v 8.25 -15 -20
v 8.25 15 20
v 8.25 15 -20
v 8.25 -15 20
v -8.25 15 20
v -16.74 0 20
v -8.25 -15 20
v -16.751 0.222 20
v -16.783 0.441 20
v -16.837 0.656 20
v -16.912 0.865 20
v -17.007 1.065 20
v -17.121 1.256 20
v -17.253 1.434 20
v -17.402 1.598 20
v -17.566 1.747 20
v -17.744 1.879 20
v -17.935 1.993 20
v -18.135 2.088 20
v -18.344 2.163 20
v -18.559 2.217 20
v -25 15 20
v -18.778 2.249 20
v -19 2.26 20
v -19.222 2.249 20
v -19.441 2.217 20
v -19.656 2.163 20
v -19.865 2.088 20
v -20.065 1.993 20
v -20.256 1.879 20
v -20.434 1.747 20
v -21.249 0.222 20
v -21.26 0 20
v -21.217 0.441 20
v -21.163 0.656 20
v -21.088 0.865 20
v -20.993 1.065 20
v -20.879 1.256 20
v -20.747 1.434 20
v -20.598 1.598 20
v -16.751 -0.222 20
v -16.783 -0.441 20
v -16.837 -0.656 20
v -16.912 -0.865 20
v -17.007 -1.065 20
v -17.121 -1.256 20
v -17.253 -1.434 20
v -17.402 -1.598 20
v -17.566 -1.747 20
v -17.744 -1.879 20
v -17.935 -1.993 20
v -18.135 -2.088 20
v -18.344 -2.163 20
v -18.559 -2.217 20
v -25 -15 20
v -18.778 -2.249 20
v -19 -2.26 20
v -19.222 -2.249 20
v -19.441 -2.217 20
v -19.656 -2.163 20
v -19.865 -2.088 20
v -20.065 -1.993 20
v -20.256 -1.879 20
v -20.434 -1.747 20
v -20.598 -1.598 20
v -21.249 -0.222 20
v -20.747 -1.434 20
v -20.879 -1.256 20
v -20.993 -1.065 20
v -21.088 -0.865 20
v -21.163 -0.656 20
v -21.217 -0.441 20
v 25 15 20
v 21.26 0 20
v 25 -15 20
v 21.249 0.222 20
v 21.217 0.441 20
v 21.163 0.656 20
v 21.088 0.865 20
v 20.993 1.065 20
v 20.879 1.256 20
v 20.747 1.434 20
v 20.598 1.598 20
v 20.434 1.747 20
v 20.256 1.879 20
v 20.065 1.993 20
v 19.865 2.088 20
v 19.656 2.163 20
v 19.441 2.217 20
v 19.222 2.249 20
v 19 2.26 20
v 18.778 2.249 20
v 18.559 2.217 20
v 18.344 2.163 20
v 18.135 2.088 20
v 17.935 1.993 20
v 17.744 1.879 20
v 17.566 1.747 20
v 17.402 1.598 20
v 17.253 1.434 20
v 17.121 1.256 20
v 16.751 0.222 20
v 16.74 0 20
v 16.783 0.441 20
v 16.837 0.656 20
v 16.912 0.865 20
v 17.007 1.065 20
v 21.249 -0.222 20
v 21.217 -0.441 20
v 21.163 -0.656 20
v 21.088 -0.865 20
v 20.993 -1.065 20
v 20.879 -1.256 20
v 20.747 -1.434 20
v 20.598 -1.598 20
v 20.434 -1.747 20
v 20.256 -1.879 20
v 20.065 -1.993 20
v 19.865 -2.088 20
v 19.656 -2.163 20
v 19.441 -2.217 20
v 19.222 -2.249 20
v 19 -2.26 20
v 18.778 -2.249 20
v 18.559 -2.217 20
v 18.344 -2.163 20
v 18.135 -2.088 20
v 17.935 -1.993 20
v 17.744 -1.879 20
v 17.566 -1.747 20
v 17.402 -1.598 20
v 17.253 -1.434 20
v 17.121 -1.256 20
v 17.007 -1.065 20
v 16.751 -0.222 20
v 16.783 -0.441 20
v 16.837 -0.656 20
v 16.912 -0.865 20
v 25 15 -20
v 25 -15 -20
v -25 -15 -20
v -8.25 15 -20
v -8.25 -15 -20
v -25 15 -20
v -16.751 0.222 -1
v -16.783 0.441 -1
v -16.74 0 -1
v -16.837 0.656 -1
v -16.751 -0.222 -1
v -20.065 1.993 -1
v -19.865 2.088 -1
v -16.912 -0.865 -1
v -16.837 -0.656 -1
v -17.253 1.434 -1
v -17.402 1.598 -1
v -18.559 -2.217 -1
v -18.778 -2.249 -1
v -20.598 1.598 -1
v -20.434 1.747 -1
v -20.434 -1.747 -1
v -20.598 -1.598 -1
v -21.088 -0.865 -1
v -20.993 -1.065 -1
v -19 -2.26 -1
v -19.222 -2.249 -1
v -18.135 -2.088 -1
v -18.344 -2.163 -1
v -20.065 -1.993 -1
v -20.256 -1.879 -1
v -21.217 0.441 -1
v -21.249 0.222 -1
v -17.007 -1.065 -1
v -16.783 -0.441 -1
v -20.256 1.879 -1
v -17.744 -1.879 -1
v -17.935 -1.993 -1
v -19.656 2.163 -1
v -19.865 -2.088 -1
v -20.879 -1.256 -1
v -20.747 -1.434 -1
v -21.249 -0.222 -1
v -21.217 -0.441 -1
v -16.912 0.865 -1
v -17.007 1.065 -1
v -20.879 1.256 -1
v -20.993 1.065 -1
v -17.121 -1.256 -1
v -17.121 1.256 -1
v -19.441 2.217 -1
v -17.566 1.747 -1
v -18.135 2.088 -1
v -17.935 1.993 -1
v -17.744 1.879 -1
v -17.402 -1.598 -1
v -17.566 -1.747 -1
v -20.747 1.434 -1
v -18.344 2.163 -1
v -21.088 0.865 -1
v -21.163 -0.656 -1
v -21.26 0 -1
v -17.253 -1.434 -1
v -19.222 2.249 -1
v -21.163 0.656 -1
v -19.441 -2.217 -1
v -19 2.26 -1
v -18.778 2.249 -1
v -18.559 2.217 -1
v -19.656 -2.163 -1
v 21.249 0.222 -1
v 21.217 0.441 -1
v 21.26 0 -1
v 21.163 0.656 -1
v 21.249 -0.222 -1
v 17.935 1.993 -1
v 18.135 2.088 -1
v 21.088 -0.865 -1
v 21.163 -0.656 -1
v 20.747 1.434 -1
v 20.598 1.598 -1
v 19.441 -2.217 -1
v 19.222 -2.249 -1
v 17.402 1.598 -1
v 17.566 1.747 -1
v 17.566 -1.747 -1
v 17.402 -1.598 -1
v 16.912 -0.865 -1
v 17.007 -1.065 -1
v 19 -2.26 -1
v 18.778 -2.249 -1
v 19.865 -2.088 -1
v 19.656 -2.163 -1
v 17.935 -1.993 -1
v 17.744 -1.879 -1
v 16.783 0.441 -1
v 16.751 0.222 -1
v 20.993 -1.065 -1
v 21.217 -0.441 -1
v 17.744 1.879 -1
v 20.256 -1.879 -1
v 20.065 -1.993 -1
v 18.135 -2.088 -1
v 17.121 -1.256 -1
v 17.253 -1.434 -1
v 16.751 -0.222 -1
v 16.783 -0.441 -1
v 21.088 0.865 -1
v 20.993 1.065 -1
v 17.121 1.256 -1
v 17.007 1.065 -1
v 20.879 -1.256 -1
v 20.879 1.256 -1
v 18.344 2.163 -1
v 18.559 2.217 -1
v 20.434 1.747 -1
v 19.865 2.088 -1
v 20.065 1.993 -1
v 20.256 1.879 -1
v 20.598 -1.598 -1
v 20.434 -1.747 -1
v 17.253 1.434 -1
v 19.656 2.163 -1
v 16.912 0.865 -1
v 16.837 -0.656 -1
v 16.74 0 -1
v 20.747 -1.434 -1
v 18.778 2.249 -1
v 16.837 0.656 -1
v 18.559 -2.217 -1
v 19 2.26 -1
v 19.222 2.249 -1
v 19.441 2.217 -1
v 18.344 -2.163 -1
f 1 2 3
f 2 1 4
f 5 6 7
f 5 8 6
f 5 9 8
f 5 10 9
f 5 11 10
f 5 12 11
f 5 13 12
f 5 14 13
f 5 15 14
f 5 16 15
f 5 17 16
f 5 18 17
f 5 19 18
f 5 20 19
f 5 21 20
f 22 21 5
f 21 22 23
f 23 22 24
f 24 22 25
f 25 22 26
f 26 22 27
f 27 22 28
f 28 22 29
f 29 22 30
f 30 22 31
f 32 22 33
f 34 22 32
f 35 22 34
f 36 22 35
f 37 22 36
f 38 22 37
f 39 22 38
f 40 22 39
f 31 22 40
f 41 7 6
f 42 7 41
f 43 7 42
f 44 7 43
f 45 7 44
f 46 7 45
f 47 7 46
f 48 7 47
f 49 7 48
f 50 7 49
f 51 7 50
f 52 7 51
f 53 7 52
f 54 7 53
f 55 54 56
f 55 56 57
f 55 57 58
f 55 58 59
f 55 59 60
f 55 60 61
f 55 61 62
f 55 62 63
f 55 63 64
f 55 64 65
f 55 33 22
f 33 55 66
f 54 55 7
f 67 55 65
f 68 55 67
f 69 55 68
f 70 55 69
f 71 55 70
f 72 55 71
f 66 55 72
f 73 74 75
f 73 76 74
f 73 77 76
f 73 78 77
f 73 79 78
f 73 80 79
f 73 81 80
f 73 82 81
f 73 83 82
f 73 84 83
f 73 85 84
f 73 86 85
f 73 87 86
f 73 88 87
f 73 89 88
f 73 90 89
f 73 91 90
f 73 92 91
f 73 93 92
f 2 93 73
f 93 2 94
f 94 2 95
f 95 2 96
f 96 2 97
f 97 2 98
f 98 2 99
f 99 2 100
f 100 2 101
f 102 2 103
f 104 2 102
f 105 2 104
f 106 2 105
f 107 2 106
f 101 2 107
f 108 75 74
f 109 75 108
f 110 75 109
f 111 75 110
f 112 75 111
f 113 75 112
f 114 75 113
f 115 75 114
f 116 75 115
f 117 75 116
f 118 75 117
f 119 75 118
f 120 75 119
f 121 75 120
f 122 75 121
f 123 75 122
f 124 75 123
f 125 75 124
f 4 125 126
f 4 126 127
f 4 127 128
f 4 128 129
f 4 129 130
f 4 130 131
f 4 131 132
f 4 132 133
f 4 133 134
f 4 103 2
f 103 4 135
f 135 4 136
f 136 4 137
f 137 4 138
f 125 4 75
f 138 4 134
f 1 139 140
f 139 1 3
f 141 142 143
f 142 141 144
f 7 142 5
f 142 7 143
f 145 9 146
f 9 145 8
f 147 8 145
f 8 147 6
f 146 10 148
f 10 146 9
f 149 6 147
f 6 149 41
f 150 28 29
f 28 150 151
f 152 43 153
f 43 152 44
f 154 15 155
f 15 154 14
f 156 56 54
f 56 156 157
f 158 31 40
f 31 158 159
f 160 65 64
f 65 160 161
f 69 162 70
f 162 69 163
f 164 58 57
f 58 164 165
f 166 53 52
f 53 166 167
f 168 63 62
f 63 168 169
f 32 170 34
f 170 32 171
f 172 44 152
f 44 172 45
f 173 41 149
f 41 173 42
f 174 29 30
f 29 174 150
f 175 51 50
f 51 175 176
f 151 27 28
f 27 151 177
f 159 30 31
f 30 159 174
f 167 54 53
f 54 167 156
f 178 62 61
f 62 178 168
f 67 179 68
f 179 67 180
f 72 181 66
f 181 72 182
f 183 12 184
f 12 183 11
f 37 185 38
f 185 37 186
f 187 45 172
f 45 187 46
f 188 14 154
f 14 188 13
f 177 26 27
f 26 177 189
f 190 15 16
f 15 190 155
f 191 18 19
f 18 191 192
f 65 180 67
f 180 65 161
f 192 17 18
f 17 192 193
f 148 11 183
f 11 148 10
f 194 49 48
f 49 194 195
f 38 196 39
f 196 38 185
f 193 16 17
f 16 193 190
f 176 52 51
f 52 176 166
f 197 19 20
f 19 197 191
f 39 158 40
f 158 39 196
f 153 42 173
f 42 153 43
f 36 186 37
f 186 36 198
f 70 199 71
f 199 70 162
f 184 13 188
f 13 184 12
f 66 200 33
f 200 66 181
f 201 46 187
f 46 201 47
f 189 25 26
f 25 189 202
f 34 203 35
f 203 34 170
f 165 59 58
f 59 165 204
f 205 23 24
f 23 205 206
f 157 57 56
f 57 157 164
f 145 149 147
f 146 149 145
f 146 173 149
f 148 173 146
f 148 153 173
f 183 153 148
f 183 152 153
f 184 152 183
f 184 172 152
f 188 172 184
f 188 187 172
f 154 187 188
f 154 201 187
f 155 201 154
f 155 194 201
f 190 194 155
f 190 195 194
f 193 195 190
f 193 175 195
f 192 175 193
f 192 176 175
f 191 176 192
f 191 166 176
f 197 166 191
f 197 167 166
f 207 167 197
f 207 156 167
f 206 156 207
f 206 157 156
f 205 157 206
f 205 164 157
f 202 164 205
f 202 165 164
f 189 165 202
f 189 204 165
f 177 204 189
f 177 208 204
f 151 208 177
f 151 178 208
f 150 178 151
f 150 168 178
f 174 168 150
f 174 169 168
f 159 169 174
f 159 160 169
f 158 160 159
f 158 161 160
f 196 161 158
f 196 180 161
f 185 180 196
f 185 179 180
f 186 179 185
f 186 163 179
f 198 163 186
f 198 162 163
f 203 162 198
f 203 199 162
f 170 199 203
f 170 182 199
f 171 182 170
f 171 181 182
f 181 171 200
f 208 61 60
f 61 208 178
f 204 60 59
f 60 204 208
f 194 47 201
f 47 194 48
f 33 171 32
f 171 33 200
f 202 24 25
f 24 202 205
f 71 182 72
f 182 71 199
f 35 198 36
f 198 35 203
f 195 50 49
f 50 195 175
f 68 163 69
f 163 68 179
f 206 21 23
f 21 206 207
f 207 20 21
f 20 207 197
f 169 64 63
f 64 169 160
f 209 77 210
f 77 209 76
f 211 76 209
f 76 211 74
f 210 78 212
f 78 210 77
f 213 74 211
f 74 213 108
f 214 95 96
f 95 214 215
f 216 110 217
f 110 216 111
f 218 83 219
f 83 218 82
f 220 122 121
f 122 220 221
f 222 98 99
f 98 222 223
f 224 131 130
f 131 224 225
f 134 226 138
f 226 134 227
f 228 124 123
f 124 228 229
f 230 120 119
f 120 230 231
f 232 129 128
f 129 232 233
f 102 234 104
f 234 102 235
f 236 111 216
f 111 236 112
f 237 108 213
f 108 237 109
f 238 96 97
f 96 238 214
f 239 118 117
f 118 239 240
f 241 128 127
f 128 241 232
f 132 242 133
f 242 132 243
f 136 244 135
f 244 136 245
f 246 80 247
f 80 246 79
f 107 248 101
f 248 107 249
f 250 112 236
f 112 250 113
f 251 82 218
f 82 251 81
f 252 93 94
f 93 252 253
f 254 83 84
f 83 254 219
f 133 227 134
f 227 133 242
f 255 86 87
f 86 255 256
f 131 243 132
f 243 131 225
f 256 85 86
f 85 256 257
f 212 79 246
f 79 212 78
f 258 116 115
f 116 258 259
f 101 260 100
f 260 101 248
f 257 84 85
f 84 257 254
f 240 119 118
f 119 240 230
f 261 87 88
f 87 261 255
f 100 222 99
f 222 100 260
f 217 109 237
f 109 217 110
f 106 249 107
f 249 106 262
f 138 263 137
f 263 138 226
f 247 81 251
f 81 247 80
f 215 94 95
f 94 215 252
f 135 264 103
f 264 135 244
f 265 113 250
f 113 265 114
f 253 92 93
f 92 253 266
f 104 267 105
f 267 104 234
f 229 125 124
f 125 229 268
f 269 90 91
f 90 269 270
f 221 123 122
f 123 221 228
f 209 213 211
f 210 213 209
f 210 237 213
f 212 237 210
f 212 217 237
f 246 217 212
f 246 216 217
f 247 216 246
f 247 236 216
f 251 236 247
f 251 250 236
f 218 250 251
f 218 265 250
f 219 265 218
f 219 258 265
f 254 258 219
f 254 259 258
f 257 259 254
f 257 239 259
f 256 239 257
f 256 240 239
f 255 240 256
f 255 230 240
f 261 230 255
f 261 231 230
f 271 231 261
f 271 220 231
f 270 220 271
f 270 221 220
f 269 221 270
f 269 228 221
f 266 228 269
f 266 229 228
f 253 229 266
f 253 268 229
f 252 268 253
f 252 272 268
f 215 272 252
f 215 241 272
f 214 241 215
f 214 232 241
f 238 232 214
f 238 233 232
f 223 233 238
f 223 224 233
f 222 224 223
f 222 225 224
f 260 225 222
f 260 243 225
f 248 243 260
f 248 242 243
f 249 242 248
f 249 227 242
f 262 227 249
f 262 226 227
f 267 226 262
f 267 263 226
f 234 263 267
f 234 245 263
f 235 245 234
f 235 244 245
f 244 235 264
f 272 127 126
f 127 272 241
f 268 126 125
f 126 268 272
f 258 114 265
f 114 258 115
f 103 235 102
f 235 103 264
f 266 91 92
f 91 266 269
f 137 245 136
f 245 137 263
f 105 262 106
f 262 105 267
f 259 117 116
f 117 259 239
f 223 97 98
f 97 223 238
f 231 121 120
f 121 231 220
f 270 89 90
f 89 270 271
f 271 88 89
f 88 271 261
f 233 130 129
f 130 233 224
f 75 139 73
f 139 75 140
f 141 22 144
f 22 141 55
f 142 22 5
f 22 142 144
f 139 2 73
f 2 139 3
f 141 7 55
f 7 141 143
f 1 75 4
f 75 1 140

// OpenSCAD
// Wall-mounted syringe holder design

// --- Global Settings ---
$fn = 64; // High resolution for curves

// --- Dimensions (in mm) ---
holder_width = 50;      // Total width of the holder (X dimension)
holder_depth = 30;      // Total depth of the holder (Y dimension)
holder_height = 40;     // Total height of the holder (Z dimension)

barrel_diameter = 16;   // Syringe barrel diameter
barrel_channel_width = 16.5; // Width of the vertical channel
flange_thickness = 2;   // Thickness of the syringe finger flange (Not directly used in geometry, but kept for reference)
flange_width = 32;      // Width of the syringe finger flange

wall_screw_hole_diameter = 4.5; // Diameter for M4 wall screws
wall_screw_hole_z = 15;  // Z position for screw holes

// --- Derived/Internal Dimensions ---
half_barrel_radius = barrel_diameter / 2; // 8 mm
channel_back_radius = 8.25; // Radius of the half-circle at the back end of the channel (R=8.25)
flange_slot_width = 34;  // Width of the flange slot (X dimension)
flange_slot_height = 2.6; // Height of the flange slot (Z dimension)
flange_slot_start_z = 30; // Start Z for flange slot
flange_slot_end_z = 32.6; // End Z for flange slot

// --- Positioning Constants ---
// Holder is centered on origin in X and Y, rests on XY plane (Z=0).
// Back face is at y = holder_depth / 2 = 15. Front face is at y = -15.
holder_center_x = 0;
holder_center_y = 0;

// --- Main Body ---
module base_holder() {
    cube([holder_width, holder_depth, holder_height], center = true);
}

// --- Features to Cut (Subtractions) ---

// 1. Syringe Barrel Channel Cut
// The channel runs along the Y axis (depth). It has a rectangular body and a semi-circular back end at y=15.
module syringe_channel_cut() {
    difference() {
        // Start with an infinitely large volume to ensure the cut goes through everything, 
        // but since we are subtracting from the holder, we just define the shape to remove.
        union() {
            // A long rectangular prism covering the straight section of the channel (X=16.5, Z=40)
            cube([barrel_channel_width, holder_depth + 2, holder_height], center = true);

            // The curved back end piece: This is a half-cylinder centered at Y=15.
            // We translate it to align the cylinder's center with the required location (Y=15) and ensure it cuts through the body.
            translate([0, holder_depth/2 + channel_back_radius - 1, 0]) {
                rotate([90, 0, 0]) { // Rotate cylinder axis to align with Y direction
                    // Cylinder height must be large enough to cover the width (X) of the channel.
                    cylinder(h = barrel_channel_width + 2, r = channel_back_radius, center = true);
                }
            }
        }
    }
}

// 2. Flange Slot Cut (Cut from front face back)
module flange_slot() {
    difference() {
        // The volume to remove: A rectangular prism spanning X=34, Z=2.6, and Y=depth of cut.
        translate([0, -holder_depth/2 + 1, flange_slot_start_z]) { // Start slightly inside the front face (y=-15)
            cube([flange_slot_width, holder_depth + 2, flange_slot_height], center = true);
        }
    }
}

// 3. Wall Screw Holes
module screw_holes() {
    difference() {
        // The volume to remove: Two cylinders running through the depth of the holder.
        union() {
            // Hole at X = -19 mm
            translate([-19, 0, wall_screw_hole_z]) {
                cylinder(h = holder_depth + 2, r = wall_screw_hole_diameter / 2 + 0.01, center = true); // Extend slightly past faces
            }

            // Hole at X = 19 mm
            translate([19, 0, wall_screw_hole_z]) {
                cylinder(h = holder_depth + 2, r = wall_screw_hole_diameter / 2 + 0.01, center = true); // Extend slightly past faces
            }
        }
    }
}


// --- Final Assembly ---

difference() {
    // Start with the base holder block
    base_holder();

    // Subtract all required features
    syringe_channel_cut();
    flange_slot();
    screw_holes();
}
